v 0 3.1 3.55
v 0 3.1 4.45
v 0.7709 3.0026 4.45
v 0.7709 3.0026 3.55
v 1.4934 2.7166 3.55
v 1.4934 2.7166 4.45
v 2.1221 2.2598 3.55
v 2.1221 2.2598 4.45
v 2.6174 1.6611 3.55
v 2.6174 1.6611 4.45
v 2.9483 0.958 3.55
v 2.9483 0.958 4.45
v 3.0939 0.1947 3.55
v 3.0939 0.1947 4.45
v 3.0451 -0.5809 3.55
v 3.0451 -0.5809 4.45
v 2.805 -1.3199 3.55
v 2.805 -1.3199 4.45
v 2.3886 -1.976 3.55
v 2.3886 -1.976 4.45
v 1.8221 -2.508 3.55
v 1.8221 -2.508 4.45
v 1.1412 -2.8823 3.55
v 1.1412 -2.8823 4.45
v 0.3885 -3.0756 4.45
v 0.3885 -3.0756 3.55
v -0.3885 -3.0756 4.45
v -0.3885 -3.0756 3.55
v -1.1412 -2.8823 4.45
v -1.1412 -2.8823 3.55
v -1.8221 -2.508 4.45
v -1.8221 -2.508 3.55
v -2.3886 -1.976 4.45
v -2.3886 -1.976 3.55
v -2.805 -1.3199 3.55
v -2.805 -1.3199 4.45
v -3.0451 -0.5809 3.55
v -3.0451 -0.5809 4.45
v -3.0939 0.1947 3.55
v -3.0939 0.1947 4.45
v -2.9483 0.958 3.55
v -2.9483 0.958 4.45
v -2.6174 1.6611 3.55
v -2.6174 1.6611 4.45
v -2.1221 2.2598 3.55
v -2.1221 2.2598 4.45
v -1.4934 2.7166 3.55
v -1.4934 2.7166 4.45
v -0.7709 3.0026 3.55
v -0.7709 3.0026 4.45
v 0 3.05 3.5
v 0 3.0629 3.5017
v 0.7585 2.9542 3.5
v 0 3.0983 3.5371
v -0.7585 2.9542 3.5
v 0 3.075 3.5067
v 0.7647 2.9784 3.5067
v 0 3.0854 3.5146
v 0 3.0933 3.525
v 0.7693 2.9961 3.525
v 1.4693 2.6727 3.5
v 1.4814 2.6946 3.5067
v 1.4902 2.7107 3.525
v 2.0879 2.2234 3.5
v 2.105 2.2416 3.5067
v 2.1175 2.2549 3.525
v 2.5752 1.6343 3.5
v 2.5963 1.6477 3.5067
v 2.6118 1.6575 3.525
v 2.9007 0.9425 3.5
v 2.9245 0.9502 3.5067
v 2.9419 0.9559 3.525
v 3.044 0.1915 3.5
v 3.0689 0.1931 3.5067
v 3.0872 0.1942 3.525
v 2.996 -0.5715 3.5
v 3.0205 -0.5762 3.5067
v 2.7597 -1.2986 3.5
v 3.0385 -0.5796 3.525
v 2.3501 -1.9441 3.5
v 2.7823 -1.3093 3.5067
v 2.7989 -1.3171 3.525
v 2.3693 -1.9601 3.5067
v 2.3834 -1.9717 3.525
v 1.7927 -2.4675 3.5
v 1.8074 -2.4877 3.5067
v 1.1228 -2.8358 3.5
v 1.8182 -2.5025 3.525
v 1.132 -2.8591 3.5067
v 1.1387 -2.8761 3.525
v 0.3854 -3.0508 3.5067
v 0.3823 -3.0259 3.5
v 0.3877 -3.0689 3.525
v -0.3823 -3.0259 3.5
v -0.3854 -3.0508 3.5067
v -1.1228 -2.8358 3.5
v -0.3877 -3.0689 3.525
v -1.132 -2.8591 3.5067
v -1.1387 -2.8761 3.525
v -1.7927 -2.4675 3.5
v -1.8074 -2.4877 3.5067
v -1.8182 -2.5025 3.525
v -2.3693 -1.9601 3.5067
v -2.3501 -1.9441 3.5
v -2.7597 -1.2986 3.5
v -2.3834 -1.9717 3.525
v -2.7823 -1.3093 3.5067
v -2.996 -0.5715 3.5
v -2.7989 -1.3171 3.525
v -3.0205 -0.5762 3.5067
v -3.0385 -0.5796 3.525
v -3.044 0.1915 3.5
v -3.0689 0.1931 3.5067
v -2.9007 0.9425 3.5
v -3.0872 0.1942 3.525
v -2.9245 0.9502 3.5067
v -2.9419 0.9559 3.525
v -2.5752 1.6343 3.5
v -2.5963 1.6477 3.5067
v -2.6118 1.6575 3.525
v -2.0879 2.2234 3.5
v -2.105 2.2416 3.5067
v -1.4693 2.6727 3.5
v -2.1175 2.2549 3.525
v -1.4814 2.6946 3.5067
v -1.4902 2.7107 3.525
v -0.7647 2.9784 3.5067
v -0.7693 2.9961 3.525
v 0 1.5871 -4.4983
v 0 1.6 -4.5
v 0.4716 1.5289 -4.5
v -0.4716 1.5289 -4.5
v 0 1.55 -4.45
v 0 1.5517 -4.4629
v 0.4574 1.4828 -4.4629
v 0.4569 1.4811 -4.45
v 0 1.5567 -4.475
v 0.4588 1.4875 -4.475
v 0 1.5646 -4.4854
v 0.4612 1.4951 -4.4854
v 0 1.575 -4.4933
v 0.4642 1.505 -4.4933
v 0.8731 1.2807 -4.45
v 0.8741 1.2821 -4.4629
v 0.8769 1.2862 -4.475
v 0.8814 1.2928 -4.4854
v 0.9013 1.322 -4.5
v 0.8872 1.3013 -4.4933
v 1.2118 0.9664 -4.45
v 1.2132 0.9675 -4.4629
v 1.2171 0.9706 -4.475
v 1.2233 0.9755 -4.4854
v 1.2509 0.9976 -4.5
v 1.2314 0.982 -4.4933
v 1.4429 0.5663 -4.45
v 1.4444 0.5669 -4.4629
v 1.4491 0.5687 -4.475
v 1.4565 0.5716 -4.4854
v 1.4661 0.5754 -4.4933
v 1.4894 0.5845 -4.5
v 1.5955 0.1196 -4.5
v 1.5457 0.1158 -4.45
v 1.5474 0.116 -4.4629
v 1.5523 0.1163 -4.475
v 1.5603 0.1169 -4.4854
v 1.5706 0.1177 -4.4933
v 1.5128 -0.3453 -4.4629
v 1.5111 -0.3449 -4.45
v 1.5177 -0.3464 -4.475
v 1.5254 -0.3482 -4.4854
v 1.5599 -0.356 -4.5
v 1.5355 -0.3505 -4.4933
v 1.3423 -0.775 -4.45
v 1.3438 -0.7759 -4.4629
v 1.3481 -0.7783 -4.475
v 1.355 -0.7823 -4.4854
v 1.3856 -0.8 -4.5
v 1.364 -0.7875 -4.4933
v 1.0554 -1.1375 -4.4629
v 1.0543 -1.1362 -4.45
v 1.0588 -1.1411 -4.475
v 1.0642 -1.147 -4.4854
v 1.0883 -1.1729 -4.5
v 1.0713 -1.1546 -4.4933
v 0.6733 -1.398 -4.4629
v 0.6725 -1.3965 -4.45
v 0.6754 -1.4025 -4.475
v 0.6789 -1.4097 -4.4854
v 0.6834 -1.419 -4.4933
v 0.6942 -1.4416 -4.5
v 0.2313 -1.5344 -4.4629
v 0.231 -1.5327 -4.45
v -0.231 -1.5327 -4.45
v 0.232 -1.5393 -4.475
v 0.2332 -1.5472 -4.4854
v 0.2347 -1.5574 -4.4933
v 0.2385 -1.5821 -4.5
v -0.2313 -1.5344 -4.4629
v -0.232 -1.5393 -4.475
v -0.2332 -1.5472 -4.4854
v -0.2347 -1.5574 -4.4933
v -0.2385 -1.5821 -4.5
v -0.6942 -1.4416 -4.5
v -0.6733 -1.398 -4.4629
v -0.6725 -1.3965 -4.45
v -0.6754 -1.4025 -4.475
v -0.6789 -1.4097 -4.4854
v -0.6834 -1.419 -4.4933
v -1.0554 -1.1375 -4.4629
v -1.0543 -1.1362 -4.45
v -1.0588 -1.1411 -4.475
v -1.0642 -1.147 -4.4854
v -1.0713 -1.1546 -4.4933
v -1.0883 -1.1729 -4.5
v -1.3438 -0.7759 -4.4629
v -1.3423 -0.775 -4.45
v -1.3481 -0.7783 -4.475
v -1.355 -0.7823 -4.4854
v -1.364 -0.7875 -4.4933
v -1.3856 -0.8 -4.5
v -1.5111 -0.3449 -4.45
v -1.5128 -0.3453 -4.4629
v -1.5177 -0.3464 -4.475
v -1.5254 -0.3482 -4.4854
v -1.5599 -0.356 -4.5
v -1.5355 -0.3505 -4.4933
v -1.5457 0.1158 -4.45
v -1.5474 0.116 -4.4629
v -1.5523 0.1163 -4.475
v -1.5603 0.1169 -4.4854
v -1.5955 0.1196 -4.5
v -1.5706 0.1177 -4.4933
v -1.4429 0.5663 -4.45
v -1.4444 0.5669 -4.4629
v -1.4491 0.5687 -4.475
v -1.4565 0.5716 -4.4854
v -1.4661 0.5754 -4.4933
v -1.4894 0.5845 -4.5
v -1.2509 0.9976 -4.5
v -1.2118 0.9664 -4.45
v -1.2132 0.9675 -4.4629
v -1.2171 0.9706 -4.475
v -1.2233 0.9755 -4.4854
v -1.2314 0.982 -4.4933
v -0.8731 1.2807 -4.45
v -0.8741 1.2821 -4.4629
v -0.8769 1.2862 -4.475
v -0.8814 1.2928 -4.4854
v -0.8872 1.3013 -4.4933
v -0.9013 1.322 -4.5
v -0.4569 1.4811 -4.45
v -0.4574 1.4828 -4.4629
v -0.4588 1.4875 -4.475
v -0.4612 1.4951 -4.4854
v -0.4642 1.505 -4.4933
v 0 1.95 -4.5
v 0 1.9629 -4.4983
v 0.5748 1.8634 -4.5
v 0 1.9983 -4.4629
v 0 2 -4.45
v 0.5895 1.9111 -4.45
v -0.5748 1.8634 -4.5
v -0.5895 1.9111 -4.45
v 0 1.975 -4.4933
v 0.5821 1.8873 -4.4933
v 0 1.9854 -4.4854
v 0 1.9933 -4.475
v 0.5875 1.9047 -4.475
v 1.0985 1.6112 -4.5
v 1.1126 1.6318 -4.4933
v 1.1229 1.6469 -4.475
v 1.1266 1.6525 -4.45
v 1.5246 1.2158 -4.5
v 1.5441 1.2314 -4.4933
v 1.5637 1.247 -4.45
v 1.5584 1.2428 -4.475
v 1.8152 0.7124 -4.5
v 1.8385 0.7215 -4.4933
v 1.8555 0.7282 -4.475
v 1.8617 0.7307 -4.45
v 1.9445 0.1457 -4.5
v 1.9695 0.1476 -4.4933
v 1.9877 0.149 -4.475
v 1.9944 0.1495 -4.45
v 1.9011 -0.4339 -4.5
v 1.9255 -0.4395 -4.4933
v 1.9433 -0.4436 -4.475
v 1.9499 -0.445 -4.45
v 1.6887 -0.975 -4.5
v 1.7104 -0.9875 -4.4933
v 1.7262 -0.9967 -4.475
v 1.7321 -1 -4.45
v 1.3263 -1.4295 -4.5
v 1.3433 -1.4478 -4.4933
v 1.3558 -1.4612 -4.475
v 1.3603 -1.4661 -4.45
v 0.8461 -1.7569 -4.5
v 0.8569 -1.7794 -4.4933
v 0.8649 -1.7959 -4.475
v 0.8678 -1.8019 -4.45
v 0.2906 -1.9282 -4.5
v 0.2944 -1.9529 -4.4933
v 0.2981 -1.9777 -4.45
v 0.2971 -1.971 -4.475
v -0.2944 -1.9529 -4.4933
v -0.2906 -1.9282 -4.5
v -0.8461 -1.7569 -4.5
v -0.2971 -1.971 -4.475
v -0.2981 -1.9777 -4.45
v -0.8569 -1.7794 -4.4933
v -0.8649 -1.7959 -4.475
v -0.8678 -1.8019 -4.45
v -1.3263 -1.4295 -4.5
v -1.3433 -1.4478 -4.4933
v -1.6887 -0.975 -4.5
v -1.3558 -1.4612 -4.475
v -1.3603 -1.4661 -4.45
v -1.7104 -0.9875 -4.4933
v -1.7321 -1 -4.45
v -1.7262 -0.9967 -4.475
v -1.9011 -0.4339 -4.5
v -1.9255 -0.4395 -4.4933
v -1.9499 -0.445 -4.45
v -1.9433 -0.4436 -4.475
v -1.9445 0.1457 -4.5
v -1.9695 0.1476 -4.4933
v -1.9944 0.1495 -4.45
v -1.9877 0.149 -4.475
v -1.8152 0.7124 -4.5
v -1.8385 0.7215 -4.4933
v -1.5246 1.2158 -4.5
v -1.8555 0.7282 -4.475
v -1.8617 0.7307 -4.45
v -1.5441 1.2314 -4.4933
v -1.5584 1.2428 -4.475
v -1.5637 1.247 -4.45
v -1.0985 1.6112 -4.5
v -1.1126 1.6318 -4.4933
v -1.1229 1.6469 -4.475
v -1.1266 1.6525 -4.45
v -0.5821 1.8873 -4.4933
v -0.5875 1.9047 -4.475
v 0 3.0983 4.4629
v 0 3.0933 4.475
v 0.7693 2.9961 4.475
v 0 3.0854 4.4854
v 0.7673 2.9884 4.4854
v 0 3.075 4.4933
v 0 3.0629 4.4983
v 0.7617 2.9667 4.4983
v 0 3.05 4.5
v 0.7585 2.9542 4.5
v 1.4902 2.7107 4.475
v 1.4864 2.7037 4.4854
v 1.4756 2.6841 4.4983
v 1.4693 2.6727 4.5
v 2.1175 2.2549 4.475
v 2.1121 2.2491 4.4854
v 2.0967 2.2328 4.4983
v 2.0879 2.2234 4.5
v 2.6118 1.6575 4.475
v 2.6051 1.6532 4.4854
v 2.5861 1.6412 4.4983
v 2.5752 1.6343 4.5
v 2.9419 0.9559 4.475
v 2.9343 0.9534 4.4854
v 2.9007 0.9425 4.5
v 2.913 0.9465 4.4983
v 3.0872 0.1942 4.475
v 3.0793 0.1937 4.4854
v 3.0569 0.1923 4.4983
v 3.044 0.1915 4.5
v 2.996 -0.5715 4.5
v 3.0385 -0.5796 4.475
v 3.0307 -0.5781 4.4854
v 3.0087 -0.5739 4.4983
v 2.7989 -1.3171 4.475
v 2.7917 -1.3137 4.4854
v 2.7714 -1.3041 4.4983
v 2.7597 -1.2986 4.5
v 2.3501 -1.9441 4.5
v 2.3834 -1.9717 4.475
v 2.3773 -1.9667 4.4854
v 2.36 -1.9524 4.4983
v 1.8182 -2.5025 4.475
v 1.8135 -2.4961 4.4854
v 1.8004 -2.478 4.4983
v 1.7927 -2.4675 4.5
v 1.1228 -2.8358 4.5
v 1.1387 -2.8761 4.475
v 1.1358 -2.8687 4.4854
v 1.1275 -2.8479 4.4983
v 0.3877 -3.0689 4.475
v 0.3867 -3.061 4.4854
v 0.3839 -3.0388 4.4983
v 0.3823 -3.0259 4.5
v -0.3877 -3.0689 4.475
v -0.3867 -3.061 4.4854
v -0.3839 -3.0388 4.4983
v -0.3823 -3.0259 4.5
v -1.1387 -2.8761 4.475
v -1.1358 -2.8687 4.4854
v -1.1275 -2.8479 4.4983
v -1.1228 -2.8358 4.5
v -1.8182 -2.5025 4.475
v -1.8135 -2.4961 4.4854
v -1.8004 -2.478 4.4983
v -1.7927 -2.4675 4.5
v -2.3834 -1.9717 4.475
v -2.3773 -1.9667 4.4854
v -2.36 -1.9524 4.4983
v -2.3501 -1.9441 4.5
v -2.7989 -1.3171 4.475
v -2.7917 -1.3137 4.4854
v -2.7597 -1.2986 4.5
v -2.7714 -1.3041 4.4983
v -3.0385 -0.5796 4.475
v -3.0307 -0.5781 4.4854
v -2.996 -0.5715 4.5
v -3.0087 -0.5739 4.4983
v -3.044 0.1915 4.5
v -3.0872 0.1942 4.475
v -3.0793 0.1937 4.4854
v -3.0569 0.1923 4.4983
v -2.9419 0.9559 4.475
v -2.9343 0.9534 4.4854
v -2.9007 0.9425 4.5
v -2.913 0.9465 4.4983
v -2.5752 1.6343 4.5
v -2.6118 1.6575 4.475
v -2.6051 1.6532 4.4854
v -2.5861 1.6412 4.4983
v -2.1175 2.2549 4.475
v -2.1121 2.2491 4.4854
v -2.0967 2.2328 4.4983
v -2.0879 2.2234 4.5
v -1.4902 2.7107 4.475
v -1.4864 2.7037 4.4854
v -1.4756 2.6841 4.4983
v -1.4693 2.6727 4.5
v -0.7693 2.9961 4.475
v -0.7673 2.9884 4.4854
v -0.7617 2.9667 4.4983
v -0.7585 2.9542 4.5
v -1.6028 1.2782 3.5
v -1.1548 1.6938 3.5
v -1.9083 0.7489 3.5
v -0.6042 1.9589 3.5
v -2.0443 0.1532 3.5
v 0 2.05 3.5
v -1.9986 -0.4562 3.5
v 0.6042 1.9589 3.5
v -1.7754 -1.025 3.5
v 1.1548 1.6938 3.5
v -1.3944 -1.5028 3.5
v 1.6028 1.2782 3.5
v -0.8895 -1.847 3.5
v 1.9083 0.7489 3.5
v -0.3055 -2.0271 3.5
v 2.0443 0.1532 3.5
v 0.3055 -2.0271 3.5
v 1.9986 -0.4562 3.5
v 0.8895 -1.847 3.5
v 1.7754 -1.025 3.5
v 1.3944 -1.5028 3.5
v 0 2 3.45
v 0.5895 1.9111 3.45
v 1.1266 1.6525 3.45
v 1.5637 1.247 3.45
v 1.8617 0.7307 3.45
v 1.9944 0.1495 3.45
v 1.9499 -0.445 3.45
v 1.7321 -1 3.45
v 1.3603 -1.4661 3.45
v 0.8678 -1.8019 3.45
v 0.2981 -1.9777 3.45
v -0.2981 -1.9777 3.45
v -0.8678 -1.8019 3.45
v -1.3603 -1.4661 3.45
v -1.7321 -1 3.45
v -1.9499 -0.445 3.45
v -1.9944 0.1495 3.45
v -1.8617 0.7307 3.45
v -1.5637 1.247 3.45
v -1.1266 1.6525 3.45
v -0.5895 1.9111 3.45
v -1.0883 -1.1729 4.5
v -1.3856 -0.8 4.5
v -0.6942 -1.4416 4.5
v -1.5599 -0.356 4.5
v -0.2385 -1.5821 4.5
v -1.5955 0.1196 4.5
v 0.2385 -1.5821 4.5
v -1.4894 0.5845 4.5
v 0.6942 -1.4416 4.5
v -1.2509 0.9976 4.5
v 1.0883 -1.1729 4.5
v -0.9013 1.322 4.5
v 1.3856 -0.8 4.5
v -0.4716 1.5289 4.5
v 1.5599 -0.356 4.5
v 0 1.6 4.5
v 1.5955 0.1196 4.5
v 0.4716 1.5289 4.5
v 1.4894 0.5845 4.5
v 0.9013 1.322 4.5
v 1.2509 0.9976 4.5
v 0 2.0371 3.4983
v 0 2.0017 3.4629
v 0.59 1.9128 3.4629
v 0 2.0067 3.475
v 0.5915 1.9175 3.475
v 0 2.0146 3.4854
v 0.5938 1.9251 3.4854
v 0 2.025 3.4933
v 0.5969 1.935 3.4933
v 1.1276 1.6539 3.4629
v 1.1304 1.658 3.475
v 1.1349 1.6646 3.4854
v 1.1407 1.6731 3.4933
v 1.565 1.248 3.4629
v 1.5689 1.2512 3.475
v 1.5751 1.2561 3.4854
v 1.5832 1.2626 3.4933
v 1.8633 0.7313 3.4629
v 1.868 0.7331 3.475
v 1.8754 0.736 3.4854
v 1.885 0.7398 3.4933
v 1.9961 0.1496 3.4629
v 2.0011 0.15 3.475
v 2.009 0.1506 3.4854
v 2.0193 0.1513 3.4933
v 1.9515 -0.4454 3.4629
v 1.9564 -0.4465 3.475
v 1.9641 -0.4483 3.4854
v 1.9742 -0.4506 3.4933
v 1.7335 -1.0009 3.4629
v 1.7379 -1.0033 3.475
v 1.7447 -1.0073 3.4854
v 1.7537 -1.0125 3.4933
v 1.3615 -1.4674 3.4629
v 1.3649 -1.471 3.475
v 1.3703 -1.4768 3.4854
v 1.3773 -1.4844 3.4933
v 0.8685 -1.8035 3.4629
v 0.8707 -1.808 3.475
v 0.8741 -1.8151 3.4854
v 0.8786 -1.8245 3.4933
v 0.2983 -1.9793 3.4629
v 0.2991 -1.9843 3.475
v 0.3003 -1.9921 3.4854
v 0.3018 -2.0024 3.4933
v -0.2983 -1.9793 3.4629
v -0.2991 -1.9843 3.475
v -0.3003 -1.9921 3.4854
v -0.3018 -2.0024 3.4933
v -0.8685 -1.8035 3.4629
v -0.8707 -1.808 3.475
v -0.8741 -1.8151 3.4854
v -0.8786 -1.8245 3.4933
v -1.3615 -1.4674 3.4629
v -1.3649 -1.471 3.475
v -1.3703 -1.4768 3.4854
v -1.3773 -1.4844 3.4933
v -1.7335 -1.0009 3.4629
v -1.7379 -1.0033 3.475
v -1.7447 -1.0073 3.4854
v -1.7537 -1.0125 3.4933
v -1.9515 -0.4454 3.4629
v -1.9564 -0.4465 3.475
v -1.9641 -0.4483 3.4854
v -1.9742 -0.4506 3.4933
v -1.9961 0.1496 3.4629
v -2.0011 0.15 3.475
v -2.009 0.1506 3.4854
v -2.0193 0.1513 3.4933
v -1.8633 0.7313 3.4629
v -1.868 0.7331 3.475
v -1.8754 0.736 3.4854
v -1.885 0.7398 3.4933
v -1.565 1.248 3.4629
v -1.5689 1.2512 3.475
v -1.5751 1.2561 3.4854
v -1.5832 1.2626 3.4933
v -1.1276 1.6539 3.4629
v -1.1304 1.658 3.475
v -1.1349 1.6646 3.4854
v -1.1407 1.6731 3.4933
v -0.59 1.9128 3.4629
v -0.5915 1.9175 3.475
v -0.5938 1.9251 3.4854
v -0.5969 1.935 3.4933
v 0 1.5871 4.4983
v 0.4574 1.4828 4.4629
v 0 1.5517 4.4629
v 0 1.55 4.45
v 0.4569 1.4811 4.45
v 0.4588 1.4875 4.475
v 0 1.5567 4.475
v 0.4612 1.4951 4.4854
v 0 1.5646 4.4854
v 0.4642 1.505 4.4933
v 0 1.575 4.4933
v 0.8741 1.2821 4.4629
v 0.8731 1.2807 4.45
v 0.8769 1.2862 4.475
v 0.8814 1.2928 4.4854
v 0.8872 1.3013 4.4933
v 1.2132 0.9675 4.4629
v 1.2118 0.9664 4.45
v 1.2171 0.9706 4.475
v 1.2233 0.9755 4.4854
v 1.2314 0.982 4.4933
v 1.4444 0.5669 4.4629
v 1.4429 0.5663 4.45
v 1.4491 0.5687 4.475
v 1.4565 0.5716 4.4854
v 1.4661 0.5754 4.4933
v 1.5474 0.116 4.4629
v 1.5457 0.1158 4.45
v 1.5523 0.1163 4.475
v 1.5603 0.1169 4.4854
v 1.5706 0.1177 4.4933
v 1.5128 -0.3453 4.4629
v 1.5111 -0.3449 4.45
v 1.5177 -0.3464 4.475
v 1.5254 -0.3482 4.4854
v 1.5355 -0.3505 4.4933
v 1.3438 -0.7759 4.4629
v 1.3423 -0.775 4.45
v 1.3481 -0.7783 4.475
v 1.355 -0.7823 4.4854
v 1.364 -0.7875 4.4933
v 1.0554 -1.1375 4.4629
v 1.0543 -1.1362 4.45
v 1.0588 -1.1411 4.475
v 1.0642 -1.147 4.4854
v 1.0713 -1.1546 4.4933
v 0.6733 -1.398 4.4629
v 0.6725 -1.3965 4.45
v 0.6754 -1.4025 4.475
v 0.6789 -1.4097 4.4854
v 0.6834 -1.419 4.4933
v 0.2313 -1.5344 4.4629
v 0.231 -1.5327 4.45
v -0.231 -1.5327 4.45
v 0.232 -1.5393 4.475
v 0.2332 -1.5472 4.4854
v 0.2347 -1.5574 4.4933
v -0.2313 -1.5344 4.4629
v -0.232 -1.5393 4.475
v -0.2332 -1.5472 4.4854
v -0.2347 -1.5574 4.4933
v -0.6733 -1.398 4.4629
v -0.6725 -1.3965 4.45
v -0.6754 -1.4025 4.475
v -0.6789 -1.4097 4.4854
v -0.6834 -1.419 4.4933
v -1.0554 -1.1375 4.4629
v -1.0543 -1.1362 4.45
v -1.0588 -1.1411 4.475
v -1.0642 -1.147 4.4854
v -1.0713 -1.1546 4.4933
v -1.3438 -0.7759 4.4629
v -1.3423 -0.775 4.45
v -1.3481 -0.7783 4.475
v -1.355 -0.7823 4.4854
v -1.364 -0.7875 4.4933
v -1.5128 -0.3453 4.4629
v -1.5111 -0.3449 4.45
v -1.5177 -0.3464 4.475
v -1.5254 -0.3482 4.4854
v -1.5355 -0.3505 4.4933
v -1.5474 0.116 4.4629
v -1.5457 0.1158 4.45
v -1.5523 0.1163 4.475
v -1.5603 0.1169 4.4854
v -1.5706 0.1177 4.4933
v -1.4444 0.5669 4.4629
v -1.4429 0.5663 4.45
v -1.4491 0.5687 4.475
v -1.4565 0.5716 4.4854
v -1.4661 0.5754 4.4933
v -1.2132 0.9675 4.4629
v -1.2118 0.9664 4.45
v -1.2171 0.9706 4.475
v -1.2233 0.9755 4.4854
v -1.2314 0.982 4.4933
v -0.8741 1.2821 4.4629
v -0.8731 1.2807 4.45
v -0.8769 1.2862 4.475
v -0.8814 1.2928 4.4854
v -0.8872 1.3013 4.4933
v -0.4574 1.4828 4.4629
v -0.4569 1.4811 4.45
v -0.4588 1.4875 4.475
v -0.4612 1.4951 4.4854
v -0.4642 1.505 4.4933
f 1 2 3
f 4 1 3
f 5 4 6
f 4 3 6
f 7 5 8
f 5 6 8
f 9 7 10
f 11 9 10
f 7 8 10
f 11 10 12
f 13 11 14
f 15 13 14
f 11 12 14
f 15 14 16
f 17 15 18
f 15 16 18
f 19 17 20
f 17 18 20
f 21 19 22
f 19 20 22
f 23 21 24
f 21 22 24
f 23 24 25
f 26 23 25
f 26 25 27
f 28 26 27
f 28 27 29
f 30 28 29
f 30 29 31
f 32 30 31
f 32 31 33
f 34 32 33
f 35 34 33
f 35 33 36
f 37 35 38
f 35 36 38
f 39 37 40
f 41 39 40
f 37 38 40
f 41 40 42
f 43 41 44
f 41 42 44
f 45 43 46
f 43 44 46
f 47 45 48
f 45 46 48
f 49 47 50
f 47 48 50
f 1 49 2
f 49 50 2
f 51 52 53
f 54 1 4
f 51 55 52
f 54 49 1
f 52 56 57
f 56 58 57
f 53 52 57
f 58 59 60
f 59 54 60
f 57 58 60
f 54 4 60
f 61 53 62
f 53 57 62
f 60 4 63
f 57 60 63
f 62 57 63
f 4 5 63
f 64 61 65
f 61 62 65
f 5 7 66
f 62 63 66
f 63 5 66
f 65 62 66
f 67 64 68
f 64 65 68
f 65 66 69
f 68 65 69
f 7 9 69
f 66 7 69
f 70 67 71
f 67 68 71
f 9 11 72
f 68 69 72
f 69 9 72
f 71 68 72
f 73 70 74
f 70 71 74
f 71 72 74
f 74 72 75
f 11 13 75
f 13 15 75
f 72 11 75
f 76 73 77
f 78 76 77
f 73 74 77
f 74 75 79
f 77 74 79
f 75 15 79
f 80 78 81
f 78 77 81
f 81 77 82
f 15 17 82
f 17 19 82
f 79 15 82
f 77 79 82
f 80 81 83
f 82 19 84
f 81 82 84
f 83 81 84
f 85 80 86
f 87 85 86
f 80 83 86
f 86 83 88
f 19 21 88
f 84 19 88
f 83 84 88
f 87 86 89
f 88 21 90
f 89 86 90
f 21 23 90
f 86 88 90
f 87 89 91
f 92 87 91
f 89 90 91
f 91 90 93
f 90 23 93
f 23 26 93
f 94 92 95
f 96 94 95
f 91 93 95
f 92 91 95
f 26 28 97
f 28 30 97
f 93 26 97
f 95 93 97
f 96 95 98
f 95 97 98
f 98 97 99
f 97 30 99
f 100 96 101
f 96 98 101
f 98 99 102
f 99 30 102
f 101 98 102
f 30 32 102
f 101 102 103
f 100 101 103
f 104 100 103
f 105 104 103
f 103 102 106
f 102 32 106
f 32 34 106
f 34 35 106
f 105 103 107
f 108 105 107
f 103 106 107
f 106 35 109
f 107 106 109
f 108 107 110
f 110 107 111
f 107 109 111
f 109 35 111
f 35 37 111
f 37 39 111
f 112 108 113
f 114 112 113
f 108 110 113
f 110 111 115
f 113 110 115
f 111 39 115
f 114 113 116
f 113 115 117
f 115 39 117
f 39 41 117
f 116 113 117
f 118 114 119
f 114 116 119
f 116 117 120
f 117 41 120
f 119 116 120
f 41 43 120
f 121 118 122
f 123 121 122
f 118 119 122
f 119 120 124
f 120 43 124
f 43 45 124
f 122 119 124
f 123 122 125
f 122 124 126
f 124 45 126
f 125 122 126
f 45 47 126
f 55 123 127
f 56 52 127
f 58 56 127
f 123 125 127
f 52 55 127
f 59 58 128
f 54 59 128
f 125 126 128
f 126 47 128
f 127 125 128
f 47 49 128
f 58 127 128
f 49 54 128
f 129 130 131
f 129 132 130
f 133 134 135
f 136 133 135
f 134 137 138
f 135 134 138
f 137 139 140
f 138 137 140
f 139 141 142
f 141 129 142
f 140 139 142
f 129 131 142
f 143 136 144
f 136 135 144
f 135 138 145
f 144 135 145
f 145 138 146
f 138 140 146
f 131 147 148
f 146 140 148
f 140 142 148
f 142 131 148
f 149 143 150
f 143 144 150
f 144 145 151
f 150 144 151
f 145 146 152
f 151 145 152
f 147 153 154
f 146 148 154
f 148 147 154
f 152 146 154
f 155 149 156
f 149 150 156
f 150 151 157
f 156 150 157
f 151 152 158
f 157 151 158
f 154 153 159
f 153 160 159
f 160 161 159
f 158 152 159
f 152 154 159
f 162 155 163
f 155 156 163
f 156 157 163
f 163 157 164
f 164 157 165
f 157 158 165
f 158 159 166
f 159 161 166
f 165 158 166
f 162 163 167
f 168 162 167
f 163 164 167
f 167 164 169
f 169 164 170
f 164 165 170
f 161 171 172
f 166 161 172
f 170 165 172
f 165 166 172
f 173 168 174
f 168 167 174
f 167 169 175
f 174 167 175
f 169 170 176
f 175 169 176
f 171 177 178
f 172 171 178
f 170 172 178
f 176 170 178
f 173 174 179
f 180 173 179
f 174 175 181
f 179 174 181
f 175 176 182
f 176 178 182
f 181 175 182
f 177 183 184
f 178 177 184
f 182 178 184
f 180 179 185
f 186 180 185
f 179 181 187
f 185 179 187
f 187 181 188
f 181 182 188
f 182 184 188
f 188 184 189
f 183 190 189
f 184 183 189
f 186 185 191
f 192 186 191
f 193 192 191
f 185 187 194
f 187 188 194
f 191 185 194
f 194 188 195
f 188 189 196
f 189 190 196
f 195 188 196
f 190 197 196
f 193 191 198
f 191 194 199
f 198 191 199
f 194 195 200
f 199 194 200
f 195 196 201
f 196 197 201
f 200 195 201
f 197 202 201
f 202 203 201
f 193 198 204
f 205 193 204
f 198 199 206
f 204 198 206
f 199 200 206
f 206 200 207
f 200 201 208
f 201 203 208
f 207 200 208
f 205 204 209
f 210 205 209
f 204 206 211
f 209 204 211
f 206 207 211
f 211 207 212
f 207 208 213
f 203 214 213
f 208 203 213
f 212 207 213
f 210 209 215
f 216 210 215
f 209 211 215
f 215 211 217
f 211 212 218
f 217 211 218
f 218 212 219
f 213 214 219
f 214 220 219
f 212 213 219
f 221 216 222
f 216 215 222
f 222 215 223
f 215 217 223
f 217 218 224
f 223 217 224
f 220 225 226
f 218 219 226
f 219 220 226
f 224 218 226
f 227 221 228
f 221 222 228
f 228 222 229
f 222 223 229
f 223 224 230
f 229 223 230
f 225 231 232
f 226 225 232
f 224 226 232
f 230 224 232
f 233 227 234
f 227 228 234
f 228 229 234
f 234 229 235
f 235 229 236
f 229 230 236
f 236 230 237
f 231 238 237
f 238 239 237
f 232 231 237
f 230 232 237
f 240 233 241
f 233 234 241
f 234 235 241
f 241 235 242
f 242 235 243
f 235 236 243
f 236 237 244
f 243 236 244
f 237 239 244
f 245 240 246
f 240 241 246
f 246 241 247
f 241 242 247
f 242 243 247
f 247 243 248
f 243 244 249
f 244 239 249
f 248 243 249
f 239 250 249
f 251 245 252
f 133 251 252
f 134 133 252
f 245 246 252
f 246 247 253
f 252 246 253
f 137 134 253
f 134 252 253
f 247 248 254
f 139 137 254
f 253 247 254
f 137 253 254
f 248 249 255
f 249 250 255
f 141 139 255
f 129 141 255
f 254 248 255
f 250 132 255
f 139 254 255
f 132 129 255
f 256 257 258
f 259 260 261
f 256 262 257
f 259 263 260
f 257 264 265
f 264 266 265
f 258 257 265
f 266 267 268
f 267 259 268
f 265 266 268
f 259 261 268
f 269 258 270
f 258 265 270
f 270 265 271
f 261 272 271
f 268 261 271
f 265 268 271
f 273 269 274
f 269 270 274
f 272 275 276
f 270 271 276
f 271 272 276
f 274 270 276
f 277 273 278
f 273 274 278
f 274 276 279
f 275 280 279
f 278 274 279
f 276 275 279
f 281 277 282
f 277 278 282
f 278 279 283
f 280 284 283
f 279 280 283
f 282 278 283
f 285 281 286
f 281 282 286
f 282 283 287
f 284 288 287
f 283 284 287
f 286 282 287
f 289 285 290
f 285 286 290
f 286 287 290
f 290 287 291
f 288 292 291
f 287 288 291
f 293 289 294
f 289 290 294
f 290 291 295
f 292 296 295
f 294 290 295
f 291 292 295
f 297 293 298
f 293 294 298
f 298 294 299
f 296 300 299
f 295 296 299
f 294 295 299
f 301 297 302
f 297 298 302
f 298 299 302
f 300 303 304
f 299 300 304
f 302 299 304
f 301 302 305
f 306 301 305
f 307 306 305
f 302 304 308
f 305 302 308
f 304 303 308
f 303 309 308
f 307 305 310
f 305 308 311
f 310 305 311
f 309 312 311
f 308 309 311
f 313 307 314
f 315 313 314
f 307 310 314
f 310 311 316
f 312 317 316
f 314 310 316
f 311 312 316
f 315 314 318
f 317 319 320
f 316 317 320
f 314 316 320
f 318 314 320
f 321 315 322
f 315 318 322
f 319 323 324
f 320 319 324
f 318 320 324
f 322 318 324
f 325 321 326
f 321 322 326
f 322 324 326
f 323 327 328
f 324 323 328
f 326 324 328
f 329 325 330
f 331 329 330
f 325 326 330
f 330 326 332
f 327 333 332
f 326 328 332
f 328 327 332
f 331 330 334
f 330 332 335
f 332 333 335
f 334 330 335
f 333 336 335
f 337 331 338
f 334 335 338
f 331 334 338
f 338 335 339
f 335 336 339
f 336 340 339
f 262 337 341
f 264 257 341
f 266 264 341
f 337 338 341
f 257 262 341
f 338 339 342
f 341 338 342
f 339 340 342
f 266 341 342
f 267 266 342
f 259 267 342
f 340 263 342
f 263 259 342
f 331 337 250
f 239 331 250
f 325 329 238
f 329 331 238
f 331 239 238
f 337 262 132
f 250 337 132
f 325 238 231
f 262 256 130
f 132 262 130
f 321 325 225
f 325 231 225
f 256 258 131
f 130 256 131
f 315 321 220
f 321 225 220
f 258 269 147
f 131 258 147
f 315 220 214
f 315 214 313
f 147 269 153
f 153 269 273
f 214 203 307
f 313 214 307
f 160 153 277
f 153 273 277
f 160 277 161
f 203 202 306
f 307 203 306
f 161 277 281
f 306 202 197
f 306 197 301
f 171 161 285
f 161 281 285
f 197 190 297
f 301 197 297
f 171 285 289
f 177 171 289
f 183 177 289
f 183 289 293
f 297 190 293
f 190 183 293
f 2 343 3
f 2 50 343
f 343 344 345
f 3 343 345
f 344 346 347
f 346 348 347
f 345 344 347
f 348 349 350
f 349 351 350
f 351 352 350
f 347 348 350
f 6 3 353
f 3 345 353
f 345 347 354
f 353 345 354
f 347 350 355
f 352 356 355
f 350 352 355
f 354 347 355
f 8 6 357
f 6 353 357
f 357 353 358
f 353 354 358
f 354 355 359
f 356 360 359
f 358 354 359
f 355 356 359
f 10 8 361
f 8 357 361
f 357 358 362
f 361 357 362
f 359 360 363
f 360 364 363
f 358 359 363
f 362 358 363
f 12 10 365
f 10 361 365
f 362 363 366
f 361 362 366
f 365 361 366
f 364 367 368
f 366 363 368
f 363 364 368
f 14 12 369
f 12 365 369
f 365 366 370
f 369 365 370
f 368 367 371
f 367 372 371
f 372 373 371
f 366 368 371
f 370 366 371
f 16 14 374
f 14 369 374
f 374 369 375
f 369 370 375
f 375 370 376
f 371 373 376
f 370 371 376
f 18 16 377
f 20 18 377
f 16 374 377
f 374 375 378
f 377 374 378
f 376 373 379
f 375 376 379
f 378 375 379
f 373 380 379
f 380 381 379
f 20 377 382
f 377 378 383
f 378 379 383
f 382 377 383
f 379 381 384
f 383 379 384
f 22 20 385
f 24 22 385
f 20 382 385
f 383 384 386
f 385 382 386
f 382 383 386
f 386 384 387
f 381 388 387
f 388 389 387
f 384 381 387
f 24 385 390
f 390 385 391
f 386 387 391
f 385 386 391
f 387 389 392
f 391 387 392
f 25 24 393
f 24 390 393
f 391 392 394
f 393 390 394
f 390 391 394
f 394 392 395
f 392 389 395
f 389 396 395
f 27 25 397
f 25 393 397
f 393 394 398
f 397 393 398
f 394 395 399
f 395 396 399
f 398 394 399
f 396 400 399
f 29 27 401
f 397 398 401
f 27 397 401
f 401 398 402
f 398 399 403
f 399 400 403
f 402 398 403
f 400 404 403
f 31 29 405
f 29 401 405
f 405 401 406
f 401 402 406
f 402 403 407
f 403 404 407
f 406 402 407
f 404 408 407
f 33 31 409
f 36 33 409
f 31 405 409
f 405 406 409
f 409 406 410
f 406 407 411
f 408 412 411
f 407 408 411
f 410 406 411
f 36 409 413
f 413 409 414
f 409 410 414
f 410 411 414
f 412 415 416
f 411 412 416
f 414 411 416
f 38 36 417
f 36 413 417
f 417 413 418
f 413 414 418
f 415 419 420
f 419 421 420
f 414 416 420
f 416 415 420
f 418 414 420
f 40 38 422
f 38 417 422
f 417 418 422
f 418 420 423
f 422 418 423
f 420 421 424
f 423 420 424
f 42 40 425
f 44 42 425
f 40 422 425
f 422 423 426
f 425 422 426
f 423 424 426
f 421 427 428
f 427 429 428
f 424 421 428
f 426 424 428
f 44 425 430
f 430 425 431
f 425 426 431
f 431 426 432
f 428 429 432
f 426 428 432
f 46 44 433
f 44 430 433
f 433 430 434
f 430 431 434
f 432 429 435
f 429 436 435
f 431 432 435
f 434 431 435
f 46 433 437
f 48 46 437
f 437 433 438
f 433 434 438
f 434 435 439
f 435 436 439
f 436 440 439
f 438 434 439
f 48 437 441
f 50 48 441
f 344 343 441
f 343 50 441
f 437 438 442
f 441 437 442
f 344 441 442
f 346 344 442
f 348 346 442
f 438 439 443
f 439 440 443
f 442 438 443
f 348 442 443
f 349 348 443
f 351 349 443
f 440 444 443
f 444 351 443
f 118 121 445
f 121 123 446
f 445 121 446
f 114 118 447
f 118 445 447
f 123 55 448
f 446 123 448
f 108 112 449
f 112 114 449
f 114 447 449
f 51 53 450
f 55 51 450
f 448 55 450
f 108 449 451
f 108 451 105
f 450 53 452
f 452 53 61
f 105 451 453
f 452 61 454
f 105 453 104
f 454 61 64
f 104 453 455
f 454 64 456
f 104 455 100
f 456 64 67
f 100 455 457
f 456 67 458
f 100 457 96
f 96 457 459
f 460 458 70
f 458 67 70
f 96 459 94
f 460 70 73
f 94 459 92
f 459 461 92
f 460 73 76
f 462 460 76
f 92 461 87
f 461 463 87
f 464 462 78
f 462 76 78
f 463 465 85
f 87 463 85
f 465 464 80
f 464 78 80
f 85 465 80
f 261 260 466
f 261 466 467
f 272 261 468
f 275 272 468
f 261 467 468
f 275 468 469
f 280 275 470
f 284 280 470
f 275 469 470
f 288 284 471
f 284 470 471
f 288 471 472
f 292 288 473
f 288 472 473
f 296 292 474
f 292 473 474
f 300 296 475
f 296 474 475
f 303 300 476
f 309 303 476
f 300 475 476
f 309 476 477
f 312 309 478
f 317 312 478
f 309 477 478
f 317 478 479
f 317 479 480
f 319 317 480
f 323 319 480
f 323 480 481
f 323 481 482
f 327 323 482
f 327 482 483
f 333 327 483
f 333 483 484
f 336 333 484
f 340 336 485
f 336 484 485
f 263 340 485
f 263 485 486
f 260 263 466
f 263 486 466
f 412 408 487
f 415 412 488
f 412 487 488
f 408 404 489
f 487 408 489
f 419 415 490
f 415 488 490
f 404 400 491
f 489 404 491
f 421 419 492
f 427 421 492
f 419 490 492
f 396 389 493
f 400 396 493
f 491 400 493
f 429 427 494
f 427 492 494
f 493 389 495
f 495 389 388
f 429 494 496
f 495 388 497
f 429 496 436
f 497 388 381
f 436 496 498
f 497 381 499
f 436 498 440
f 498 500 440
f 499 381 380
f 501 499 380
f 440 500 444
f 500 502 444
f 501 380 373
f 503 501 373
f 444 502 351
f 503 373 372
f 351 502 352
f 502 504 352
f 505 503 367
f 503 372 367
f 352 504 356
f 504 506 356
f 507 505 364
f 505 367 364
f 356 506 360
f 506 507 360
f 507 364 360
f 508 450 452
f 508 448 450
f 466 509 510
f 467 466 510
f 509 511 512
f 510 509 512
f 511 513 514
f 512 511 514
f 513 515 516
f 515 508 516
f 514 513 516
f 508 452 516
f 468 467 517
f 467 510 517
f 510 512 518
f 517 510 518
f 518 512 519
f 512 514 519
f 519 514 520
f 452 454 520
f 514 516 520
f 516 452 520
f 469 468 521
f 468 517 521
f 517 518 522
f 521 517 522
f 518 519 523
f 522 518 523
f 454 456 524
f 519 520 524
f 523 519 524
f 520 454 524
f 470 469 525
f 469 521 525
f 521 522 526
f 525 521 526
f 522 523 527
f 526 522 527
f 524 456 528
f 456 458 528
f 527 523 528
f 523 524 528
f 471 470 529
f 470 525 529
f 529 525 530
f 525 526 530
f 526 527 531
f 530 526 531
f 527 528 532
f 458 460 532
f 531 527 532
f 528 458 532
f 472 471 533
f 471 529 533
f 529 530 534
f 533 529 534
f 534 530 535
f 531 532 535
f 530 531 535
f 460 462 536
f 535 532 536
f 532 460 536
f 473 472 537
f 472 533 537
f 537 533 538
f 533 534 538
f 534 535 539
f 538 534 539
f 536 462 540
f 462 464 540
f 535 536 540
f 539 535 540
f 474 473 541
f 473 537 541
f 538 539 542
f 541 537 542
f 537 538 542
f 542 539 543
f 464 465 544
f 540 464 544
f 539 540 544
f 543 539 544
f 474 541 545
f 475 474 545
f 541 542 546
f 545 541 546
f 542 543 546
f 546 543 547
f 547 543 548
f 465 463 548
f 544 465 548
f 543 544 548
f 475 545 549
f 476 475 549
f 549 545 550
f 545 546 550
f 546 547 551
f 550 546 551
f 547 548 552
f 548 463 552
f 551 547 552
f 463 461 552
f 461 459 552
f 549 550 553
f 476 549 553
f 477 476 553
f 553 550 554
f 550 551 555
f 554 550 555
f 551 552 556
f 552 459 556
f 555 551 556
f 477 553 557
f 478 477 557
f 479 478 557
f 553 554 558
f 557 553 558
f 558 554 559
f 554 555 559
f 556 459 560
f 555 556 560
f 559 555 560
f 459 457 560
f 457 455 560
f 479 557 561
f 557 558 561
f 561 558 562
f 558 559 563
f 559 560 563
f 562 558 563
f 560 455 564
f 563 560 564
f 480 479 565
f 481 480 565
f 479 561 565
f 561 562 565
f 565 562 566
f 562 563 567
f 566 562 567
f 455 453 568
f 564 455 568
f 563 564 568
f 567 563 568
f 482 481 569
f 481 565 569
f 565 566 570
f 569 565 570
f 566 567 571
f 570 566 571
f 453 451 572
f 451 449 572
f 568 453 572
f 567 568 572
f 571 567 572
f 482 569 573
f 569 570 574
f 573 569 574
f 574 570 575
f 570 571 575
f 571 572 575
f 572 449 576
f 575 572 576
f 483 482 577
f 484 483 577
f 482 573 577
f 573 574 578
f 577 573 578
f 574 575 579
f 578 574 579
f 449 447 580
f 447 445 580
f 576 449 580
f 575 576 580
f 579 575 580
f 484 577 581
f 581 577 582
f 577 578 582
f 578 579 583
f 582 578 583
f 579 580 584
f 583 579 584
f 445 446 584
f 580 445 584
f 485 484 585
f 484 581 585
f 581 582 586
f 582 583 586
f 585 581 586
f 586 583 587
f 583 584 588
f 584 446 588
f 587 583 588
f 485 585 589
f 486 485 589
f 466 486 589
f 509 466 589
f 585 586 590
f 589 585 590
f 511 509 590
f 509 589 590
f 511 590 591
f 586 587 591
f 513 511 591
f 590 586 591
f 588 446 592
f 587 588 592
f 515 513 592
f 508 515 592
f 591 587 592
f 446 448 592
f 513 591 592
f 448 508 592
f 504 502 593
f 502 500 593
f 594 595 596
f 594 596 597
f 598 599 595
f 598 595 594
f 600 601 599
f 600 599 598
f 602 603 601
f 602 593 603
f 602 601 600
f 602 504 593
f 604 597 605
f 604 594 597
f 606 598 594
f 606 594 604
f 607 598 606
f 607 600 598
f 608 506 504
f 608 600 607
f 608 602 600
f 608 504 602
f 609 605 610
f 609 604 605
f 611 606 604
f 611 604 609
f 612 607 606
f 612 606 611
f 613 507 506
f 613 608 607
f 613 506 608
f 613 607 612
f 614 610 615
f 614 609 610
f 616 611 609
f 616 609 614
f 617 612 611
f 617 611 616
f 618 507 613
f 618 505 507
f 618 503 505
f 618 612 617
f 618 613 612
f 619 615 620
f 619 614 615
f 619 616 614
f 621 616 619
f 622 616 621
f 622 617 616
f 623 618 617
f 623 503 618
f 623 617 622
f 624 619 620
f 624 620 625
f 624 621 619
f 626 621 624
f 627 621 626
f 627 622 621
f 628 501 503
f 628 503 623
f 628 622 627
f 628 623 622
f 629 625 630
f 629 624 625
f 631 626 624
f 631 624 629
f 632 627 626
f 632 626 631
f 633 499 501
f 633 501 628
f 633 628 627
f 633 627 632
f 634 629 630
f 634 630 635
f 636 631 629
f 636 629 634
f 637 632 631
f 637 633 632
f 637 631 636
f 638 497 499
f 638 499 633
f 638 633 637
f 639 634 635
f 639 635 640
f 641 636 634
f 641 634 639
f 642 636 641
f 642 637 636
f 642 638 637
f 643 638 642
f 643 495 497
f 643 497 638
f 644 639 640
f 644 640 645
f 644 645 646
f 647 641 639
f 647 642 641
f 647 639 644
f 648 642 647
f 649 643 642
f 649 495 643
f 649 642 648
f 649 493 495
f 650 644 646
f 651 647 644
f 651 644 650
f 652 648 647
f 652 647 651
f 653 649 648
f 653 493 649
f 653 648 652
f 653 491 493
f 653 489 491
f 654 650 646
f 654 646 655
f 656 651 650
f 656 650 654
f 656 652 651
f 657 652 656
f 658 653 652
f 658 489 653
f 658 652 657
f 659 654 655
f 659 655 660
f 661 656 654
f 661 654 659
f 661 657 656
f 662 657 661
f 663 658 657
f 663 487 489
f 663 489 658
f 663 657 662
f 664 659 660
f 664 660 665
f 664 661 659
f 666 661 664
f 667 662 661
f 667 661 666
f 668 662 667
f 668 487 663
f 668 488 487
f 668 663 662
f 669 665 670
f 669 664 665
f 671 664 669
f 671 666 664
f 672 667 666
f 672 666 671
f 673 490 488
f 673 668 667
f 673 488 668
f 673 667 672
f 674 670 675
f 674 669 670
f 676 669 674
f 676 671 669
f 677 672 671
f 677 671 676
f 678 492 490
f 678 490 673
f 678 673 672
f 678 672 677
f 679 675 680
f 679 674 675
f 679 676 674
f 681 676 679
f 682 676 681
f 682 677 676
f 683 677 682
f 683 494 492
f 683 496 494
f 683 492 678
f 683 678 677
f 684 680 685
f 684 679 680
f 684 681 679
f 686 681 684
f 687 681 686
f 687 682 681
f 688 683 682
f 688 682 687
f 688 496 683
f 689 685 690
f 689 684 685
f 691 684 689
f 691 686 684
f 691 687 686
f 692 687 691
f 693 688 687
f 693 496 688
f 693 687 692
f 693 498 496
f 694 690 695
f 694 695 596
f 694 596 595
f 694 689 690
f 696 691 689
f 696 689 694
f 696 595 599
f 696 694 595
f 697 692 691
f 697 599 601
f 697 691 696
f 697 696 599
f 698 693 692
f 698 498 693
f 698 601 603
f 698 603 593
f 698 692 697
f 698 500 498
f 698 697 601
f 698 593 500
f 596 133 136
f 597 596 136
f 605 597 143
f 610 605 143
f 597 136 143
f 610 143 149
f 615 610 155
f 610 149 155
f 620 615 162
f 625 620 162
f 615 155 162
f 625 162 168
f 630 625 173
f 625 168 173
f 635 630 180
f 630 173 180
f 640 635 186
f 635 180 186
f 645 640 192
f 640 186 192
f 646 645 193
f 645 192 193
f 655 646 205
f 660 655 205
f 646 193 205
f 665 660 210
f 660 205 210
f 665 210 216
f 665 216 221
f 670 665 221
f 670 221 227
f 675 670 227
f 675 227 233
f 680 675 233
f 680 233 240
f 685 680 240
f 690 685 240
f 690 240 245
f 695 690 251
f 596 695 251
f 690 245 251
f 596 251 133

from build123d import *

# Parameters (mm, degrees)
FILLET1_R = 0.05


with BuildPart() as part:
    # Sketch2 → Revolve1 (revolve)
    with BuildSketch(Plane(origin=(0, 0, 0), x_dir=(0, 0, -1), z_dir=(1, 0, 0))):
        Polygon((-4.5, 1.55), (4.5, 1.55), (4.5, 2), (-3.5, 2), (-3.5, 3.1), (-4.5, 3.1), align=None)
    revolve(axis=Axis((0, 0, 4.5), (0, 0, -1)))

    # Fillet1
    fillet1_edges = [part.edges().sort_by_distance(p)[0] for p in [
        (0, -3.1, 4.5),
        (0, -3.1, 3.5),
        (0, -2, 3.5),
        (0, -2, -4.5),
        (0, -1.55, -4.5),
        (0, -1.55, 4.5),
    ]]
    fillet(fillet1_edges, radius=FILLET1_R)


solid = part.part
